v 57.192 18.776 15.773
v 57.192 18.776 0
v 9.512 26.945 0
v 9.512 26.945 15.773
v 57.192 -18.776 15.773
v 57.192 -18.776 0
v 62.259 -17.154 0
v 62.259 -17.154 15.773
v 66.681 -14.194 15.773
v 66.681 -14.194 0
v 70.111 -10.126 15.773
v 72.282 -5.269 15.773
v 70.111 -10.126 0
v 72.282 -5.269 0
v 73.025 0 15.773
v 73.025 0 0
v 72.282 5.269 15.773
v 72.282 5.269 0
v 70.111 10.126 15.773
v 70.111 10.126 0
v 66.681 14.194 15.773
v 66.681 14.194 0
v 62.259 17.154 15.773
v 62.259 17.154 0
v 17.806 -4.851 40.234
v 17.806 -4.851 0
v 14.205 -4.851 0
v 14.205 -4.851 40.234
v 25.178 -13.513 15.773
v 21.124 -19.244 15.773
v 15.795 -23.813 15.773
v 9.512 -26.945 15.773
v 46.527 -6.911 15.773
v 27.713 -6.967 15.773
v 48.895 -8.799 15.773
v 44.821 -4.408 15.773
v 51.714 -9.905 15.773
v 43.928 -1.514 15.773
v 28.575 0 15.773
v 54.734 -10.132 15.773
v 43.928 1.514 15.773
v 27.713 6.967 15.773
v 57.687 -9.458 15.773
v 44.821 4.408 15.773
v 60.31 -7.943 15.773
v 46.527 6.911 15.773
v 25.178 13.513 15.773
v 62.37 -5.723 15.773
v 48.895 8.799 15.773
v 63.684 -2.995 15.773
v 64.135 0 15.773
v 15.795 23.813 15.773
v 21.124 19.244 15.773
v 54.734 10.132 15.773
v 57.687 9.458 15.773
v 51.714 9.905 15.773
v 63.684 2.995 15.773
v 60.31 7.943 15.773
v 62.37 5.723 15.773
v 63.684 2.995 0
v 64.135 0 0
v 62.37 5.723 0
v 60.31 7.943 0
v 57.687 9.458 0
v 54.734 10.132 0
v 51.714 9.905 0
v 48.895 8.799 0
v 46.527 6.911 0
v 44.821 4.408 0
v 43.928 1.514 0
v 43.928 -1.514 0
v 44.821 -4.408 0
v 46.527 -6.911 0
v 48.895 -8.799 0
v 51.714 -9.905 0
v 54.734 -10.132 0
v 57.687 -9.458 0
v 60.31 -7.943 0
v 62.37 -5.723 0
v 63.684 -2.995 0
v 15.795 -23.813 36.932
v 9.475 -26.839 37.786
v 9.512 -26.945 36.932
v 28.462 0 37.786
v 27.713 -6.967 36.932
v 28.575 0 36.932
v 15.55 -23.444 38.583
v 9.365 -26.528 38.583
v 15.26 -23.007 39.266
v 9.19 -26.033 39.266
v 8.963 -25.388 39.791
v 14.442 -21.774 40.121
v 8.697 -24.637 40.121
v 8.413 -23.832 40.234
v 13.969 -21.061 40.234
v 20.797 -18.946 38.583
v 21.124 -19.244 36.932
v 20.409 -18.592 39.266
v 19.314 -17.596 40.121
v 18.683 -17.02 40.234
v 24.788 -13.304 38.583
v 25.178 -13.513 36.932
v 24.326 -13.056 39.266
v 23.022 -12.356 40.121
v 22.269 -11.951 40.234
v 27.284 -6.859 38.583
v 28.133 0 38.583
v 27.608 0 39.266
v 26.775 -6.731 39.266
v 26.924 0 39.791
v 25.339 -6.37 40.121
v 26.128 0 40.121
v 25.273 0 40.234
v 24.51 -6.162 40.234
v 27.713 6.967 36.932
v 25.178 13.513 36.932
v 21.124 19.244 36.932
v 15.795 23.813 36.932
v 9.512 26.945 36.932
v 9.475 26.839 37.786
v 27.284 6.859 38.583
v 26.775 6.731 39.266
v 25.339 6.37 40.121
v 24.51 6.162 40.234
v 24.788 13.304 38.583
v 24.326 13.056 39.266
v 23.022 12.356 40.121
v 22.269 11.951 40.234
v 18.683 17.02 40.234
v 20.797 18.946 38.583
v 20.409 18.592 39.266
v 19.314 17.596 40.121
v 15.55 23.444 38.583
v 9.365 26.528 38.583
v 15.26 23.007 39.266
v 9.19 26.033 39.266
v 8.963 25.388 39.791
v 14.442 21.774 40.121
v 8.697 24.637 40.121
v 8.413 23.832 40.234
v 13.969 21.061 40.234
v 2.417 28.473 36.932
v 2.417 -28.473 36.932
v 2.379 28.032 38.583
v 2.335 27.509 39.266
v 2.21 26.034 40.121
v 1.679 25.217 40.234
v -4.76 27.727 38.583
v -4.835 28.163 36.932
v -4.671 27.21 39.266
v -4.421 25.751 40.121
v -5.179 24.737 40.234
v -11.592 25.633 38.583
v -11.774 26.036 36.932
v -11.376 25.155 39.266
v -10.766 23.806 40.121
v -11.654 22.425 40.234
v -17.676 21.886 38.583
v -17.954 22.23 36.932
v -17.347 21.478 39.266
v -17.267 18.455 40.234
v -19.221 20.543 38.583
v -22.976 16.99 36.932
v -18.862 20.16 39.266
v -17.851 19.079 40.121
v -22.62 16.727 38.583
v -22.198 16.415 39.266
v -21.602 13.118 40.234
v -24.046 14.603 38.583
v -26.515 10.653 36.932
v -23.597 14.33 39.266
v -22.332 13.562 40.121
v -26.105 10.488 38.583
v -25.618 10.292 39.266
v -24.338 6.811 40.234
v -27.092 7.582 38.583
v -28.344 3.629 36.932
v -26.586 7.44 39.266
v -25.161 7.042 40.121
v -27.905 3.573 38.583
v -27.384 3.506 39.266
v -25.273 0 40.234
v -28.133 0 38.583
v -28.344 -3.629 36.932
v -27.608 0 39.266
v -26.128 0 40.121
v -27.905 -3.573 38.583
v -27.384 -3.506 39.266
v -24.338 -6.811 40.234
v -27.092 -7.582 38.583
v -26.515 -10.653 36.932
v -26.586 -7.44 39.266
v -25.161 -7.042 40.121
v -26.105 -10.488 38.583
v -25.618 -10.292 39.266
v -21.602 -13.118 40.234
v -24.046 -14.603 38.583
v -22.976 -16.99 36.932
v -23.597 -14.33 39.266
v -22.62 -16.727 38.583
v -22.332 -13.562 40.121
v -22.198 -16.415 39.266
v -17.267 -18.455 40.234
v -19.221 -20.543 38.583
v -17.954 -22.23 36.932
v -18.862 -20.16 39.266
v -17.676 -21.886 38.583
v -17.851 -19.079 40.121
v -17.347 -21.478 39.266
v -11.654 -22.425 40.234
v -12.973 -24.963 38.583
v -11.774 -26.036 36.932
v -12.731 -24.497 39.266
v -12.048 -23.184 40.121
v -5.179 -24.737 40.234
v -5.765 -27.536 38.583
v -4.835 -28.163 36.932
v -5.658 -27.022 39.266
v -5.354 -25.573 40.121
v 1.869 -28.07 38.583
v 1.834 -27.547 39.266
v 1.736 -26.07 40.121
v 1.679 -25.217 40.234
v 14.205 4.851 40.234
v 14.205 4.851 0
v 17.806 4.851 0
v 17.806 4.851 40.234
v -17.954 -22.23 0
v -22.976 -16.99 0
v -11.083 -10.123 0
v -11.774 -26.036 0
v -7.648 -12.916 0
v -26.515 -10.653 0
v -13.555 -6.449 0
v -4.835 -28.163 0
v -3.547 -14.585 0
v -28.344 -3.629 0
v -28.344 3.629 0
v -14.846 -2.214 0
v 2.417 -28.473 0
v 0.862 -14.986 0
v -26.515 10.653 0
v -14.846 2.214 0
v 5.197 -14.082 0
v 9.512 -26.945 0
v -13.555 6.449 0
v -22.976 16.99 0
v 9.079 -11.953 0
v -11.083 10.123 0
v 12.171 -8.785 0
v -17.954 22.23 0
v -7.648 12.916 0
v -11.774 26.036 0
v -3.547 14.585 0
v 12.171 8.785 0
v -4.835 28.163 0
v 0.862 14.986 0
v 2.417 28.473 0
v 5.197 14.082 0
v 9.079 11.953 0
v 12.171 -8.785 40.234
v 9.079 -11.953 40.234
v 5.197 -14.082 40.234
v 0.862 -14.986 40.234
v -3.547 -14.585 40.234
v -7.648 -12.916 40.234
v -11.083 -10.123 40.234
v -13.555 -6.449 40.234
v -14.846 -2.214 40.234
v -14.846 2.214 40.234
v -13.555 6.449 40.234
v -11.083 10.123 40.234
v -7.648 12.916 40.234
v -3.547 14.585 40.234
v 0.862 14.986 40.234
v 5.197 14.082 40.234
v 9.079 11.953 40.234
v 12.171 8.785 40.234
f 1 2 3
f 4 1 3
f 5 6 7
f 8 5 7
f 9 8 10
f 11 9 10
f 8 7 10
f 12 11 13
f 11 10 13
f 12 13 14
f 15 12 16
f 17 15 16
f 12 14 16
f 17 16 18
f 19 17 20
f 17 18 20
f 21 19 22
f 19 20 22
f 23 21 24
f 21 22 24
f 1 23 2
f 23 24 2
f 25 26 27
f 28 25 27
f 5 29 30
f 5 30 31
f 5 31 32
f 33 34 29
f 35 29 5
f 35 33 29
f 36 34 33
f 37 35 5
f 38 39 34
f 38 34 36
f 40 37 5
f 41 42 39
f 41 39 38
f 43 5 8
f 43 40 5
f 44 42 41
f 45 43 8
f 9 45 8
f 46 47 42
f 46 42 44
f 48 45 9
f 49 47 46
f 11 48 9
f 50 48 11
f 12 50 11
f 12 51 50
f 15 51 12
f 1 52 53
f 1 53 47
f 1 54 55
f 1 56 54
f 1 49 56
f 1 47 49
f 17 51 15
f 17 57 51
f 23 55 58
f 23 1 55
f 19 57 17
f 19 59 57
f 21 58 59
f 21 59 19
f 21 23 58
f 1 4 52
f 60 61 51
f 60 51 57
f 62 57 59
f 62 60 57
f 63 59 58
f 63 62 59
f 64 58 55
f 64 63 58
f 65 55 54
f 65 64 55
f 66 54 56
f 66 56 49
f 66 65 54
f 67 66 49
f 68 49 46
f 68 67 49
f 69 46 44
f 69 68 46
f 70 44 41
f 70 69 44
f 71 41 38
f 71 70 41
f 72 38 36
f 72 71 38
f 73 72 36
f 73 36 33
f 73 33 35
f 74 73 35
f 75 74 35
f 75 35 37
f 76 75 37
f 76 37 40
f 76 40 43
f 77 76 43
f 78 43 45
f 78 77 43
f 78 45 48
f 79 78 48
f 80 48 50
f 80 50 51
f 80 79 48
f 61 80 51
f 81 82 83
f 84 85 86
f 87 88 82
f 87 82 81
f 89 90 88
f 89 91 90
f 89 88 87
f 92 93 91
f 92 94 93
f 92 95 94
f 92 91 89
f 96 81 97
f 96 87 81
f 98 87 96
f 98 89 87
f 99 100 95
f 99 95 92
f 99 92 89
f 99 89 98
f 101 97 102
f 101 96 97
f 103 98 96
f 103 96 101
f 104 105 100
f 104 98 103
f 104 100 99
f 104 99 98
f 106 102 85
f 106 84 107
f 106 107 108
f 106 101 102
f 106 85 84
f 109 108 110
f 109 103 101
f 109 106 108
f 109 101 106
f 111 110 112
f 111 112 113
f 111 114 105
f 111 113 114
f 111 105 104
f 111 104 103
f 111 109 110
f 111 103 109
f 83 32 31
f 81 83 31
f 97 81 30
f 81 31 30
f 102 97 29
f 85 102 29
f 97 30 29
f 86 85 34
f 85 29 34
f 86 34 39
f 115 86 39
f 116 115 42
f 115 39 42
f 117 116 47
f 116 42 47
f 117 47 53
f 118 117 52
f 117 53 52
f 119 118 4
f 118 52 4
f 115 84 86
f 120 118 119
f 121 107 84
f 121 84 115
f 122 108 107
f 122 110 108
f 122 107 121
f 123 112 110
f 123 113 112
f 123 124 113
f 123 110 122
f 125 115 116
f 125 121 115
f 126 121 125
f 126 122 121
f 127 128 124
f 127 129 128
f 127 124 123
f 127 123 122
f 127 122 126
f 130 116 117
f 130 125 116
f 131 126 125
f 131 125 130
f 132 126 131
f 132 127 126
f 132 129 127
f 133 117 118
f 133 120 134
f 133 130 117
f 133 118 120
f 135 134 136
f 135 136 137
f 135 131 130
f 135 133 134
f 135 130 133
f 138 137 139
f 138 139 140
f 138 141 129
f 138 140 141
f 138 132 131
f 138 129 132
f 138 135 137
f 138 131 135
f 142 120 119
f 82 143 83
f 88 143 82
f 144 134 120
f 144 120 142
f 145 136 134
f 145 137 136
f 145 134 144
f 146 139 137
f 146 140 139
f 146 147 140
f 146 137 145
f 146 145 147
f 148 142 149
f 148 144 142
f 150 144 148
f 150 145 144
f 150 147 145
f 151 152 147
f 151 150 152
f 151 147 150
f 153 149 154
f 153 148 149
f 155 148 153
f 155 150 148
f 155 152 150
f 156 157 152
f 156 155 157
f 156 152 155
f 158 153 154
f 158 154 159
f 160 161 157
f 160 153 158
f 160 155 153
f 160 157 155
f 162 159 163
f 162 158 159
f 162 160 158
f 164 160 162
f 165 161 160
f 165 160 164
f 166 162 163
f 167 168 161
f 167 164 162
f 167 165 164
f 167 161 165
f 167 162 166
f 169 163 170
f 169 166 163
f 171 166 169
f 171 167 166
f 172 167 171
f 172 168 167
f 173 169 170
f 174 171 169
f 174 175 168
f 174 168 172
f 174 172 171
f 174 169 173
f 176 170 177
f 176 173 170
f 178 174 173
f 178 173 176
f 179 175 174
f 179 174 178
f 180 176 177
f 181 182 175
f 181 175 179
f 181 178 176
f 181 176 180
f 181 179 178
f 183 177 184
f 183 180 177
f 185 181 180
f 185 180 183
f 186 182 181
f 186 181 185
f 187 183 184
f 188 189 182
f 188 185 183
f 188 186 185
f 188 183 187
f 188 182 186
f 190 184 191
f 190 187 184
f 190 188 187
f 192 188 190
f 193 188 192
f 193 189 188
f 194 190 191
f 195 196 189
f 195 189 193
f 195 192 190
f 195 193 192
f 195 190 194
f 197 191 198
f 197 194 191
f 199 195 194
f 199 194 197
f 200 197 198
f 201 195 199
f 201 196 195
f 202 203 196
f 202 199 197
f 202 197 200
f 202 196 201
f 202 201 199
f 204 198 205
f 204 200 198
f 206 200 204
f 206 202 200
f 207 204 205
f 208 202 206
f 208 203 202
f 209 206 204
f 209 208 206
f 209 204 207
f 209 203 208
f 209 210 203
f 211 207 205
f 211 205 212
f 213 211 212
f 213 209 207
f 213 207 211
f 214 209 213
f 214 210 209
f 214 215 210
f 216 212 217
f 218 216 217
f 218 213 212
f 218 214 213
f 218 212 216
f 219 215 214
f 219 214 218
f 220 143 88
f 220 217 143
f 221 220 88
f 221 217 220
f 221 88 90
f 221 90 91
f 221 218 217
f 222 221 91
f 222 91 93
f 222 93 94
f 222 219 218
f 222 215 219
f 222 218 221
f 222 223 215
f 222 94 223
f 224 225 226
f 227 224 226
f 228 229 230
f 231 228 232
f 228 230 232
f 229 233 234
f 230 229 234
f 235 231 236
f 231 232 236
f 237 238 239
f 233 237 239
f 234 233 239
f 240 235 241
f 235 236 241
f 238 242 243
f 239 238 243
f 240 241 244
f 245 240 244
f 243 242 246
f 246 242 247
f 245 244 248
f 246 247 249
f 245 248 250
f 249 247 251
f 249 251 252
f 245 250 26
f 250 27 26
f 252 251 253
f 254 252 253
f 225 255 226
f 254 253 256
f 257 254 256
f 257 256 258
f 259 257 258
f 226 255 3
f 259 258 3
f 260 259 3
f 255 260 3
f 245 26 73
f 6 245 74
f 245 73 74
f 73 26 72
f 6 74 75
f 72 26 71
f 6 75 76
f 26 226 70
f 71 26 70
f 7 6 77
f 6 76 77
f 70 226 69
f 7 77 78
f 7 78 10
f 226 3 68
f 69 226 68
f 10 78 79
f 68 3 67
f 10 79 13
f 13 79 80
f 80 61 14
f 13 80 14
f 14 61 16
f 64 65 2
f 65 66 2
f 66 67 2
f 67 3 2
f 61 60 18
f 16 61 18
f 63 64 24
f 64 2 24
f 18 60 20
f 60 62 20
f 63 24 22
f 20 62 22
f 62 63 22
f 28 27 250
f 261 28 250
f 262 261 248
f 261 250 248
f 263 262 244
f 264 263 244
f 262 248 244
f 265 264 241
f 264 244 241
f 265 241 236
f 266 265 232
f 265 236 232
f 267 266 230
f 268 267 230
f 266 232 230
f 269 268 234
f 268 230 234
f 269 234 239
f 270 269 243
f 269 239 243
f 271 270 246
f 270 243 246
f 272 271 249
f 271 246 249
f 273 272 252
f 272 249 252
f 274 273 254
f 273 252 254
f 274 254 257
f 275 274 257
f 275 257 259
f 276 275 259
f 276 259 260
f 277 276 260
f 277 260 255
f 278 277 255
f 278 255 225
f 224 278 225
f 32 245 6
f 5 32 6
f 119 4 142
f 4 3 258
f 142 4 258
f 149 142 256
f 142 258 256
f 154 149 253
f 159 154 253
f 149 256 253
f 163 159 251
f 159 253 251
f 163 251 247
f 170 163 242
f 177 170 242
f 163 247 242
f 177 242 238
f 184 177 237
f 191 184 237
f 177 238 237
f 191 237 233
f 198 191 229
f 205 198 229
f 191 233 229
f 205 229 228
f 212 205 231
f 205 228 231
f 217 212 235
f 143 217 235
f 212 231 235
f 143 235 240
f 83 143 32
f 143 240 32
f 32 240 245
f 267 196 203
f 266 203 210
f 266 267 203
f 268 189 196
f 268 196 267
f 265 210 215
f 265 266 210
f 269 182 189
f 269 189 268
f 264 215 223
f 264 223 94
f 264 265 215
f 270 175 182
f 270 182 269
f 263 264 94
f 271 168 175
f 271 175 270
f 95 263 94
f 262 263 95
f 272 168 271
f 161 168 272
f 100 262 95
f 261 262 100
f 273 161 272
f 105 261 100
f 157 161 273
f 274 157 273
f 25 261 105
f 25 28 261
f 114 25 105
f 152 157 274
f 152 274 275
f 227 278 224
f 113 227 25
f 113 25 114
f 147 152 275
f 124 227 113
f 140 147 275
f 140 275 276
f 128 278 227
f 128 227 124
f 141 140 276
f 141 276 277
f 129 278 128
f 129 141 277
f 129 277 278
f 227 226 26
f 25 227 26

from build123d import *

# Parameters (mm, degrees)
F0_R     = 24.9326348986
F1_DEPTH = 40.2336
F2_R     = 10.16
F3_DEPTH = 15.7734
F4_R     = 3.302


with BuildPart() as f1:
    # F0 (on Top) → F1 (new body)
    with BuildSketch(Plane.XY):
        with BuildLine():
            ThreePointArc((9.5121844836, -26.9452959039), (23.3274655355, -16.5033322905), (28.575, 0))
            ThreePointArc((28.575, 0), (23.3274655355, 16.5033322905), (9.5121844836, 26.9452959039))
            ThreePointArc((9.5121844836, 26.9452959039), (-28.575, 0), (9.5121844836, -26.9452959039))
        make_face()
        Circle(F0_R, mode=Mode.SUBTRACT)
        Circle(F0_R)
        with BuildLine():
            ThreePointArc((14.2048280027, -4.8514), (-15.0104370538, 0), (14.2048280027, 4.8514))
            Line((14.2048280027, 4.8514), (17.8063629462, 4.8514))
            Line((17.8063629462, 4.8514), (17.8063629462, -4.8514))
            Line((17.8063629462, -4.8514), (14.2048280027, -4.8514))
        make_face(mode=Mode.SUBTRACT)
    extrude(amount=F1_DEPTH)

    # F2 (on face) → F3 (join)
    with BuildSketch(Plane.XY):
        with BuildLine():
            Line((57.1919272622, 18.7764181619), (9.5121844836, 26.9452959039))
            ThreePointArc((9.5121844836, 26.9452959039), (23.3274655355, 16.5033322905), (28.575, 0))
            ThreePointArc((28.575, 0), (23.3274655355, -16.5033322905), (9.5121844836, -26.9452959039))
            Line((9.5121844836, -26.9452959039), (57.1919272622, -18.7764181619))
            ThreePointArc((57.1919272622, -18.7764181619), (73.025, 0), (57.1919272622, 18.7764181619))
        make_face()
        with Locations((53.975, 0)):
            Circle(F2_R, mode=Mode.SUBTRACT)
    extrude(amount=F3_DEPTH)

    # F4
    f4_edges = [f1.edges().sort_by_distance(p)[0] for p in [
        (-28.575, 0, 40.2336),
    ]]
    fillet(f4_edges, radius=F4_R)


solid = f1.part
